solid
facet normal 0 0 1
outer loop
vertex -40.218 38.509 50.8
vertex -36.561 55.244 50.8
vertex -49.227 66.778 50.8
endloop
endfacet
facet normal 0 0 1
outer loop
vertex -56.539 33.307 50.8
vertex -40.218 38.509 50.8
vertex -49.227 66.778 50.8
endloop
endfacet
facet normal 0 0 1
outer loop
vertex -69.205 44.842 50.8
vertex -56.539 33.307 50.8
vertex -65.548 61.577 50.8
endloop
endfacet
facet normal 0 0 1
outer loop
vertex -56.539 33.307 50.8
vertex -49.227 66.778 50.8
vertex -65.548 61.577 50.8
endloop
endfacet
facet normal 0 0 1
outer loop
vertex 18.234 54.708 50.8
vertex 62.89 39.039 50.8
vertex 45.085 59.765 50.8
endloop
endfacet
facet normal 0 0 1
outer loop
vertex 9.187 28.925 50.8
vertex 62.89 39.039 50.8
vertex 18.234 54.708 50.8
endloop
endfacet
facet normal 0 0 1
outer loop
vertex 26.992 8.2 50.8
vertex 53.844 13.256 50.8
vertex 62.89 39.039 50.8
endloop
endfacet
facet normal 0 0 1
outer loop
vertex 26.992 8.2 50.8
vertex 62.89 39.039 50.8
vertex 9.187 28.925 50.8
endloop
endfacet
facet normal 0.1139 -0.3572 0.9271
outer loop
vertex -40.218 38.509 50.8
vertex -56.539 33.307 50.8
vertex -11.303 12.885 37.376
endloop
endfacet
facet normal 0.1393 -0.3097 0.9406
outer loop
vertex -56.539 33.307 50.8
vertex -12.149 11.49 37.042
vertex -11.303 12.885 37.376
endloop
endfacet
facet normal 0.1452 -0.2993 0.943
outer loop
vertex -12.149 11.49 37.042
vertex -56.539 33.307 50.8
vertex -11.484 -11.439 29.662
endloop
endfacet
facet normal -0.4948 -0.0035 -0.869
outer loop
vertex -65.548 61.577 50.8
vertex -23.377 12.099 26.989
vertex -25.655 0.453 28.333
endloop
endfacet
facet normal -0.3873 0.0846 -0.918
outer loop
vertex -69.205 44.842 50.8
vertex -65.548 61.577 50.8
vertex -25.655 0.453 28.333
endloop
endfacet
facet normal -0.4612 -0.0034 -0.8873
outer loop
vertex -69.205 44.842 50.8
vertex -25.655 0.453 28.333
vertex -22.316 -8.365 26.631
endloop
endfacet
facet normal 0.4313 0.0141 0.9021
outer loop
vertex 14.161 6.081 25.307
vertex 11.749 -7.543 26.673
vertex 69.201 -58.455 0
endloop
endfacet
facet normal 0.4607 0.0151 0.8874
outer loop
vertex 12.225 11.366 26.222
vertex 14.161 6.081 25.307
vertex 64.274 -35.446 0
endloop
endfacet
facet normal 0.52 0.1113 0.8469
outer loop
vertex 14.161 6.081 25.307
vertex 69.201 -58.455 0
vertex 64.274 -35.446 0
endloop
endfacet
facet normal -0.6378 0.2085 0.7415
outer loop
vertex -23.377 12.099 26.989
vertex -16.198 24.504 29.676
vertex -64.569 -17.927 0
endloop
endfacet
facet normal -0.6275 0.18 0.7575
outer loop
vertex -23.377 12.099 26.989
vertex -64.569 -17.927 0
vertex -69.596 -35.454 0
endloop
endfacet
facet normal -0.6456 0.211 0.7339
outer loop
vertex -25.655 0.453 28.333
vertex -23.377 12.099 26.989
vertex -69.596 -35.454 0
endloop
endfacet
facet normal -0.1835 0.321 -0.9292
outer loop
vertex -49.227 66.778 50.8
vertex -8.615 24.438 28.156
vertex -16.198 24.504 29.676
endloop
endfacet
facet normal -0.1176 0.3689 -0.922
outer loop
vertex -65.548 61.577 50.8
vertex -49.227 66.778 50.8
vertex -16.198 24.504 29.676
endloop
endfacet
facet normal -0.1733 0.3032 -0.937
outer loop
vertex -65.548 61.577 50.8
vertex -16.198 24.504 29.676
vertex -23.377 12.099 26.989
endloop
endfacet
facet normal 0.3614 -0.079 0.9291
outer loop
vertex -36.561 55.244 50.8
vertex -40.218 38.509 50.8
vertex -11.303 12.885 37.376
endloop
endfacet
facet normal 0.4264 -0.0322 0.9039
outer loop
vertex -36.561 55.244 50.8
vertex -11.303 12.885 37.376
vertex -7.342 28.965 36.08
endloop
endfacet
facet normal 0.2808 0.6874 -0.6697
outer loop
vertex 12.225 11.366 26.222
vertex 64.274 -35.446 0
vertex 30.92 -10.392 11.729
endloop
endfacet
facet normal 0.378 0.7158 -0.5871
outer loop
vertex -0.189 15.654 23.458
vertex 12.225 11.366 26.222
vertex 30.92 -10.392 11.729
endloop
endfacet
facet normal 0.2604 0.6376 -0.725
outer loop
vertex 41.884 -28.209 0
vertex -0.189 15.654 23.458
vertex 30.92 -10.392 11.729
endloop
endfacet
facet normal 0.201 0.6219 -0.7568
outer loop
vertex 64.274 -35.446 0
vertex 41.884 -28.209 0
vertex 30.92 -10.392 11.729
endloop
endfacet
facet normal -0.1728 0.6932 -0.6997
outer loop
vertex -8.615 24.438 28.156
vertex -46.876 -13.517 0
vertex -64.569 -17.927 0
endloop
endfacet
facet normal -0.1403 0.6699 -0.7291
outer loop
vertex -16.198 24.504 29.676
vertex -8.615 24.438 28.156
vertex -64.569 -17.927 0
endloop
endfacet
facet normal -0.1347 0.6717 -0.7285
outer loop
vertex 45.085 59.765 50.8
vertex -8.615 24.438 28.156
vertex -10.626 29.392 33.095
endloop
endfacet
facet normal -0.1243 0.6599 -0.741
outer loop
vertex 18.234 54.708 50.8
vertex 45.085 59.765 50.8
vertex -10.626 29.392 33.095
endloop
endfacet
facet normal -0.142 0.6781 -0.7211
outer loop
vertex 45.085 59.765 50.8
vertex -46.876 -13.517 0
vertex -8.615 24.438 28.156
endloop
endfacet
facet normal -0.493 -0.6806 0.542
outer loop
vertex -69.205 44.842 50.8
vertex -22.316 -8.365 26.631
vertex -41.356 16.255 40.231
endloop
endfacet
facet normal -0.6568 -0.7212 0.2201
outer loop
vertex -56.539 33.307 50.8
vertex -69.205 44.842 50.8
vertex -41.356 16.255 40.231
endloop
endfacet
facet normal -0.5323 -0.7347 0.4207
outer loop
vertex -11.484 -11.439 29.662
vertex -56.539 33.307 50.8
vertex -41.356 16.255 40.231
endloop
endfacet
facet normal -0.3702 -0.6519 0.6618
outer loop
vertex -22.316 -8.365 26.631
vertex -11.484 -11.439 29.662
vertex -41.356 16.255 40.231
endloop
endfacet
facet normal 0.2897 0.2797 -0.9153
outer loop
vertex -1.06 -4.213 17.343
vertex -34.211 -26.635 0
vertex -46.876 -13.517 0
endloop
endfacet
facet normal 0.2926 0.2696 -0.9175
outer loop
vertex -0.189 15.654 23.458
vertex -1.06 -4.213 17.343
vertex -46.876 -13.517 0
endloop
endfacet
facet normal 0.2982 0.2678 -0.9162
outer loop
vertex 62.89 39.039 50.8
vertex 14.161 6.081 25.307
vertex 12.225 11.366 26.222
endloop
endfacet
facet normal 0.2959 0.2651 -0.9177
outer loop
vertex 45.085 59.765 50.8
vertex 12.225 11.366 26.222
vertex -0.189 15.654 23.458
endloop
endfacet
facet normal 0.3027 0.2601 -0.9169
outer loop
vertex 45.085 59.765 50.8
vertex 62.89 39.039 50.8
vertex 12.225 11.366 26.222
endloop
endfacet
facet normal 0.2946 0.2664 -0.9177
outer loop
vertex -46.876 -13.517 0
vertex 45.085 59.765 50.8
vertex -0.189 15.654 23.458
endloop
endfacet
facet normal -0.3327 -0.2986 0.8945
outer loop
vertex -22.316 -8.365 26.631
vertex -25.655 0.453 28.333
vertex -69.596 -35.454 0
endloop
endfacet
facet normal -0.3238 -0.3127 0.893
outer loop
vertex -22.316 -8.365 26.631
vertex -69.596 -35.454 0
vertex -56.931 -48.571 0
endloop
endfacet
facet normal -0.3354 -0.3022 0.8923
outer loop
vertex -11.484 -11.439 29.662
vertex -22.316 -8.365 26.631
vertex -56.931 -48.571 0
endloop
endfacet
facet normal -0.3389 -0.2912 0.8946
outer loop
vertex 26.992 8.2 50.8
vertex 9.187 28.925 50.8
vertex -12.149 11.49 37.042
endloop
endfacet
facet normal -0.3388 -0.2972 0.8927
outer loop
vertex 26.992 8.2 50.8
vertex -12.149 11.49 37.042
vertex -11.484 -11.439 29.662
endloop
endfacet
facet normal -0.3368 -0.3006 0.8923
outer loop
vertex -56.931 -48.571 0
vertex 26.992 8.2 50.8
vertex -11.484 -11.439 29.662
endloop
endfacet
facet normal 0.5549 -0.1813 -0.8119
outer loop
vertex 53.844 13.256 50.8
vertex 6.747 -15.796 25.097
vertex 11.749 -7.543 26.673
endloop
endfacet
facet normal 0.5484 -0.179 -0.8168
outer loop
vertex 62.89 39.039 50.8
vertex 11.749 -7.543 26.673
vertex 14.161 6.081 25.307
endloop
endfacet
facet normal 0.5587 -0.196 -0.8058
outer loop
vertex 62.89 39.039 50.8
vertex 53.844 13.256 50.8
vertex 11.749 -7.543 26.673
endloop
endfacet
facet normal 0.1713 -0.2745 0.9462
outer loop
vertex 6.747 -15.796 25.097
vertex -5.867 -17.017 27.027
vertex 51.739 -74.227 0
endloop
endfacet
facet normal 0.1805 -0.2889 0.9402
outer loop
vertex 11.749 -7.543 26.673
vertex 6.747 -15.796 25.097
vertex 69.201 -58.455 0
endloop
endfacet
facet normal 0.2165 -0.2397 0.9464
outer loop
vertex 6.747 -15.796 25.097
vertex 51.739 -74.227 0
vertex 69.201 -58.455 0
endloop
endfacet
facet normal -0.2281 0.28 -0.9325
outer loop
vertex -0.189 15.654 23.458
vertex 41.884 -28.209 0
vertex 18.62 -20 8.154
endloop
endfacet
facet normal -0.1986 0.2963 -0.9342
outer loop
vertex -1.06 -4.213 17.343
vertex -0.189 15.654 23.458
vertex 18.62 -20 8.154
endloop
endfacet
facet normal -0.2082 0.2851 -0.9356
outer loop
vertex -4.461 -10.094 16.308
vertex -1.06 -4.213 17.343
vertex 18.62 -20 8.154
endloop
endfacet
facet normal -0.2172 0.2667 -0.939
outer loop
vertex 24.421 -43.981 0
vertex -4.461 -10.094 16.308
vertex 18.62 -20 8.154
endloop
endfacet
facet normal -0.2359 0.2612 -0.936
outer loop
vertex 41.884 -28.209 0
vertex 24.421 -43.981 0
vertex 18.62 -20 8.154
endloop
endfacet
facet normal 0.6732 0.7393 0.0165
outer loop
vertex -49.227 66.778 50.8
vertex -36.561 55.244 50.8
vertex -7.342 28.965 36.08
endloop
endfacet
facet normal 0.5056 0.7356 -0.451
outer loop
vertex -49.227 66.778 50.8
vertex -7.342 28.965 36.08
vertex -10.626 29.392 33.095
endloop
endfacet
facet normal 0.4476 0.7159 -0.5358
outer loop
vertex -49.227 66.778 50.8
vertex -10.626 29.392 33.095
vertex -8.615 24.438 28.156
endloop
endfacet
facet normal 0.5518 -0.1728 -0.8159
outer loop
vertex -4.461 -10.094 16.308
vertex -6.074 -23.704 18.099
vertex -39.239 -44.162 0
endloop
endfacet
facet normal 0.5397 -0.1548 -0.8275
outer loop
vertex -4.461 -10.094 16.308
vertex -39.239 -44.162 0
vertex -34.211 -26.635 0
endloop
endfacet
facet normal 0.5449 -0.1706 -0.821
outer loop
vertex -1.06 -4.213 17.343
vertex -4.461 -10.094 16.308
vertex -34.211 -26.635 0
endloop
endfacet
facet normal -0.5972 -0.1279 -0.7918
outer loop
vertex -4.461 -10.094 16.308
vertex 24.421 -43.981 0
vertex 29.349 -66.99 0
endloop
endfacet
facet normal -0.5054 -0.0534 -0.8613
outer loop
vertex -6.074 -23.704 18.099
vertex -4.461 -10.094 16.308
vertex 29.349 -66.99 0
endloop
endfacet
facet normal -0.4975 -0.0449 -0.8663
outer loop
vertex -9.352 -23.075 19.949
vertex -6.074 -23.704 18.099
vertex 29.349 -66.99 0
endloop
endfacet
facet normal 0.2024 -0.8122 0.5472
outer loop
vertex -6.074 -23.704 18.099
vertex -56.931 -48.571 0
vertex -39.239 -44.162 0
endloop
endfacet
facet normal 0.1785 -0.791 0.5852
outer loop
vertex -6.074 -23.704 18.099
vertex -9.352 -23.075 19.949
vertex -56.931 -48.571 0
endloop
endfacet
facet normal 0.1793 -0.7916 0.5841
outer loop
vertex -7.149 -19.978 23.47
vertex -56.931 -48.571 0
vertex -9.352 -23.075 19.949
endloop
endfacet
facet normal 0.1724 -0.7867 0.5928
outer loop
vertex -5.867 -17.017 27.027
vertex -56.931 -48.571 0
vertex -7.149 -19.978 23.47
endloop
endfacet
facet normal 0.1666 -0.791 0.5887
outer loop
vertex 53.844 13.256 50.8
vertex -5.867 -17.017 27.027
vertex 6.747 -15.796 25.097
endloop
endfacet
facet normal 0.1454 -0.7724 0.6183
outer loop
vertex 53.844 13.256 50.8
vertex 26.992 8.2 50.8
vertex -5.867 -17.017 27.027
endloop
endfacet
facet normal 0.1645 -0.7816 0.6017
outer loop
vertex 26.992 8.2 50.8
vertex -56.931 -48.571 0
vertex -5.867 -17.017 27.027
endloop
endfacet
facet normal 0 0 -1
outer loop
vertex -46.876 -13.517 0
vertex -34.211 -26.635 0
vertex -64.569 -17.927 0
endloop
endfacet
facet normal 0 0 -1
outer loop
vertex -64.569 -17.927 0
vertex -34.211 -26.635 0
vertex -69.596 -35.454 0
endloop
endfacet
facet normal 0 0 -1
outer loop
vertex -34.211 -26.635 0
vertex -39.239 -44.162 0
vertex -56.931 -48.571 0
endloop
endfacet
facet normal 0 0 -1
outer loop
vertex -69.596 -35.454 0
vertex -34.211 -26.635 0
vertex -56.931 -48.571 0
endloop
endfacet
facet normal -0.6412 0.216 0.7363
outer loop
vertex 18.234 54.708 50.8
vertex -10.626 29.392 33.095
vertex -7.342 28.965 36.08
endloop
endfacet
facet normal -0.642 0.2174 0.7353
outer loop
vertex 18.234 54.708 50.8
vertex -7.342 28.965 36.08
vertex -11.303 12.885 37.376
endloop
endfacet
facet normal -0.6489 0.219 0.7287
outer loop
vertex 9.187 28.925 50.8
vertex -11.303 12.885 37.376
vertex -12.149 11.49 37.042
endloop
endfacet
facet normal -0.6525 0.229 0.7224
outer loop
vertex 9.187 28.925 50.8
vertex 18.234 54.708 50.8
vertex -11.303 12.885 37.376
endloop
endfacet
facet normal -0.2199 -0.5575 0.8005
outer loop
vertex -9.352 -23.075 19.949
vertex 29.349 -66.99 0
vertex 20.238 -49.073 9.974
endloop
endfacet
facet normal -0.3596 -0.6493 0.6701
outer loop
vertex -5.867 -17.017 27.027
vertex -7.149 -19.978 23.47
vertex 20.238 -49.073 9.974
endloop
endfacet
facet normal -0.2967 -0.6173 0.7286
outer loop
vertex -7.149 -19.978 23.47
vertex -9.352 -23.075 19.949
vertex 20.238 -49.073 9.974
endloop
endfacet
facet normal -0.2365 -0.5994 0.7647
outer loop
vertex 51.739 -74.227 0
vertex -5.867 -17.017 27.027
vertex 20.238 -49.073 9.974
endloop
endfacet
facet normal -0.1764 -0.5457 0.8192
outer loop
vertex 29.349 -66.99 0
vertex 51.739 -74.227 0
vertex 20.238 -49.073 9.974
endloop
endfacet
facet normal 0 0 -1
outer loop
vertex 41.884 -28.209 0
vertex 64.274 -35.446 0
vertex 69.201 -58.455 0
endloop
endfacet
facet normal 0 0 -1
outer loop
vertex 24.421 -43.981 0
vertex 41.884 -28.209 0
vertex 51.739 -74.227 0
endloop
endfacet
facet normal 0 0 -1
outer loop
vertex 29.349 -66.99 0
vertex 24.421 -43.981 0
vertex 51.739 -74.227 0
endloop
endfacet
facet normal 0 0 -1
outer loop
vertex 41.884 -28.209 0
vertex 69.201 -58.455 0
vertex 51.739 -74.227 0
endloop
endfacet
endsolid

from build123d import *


with BuildPart() as f3:
    # F2 (on Top) → F3 section 0
    with BuildSketch(Plane.XY):
        Polygon((-34.211059, -26.634676), (-46.876188, -13.517221), (-64.568802, -17.926818), (-69.596286, -35.453869), (-56.931157, -48.571324), (-39.238543, -44.161728), align=None)
    # F1 (on offset) → F3 section 1
    with BuildSketch(Plane.XY.offset(50.8)):
        Polygon((18.233662, 54.708021), (9.187146, 28.925439), (26.992259, 8.199635), (53.843888, 13.256413), (62.890404, 39.038996), (45.085291, 59.7648), align=None)
    loft()

    # F5 (on offset) → F6 section 0
    with BuildSketch(Plane.XY.offset(50.8)):
        Polygon((-36.561417, 55.244139), (-49.226542, 66.778452), (-65.548113, 61.577289), (-69.204559, 44.841812), (-56.539434, 33.307499), (-40.217863, 38.508662), align=None)
    # F4 (on Top) → F6 section 1
    with BuildSketch(Plane.XY):
        Polygon((64.273919, -35.446326), (41.883779, -28.209117), (24.421101, -43.980943), (29.348564, -66.989978), (51.738705, -74.227187), (69.201382, -58.455361), align=None)
    loft()


solid = f3.part
